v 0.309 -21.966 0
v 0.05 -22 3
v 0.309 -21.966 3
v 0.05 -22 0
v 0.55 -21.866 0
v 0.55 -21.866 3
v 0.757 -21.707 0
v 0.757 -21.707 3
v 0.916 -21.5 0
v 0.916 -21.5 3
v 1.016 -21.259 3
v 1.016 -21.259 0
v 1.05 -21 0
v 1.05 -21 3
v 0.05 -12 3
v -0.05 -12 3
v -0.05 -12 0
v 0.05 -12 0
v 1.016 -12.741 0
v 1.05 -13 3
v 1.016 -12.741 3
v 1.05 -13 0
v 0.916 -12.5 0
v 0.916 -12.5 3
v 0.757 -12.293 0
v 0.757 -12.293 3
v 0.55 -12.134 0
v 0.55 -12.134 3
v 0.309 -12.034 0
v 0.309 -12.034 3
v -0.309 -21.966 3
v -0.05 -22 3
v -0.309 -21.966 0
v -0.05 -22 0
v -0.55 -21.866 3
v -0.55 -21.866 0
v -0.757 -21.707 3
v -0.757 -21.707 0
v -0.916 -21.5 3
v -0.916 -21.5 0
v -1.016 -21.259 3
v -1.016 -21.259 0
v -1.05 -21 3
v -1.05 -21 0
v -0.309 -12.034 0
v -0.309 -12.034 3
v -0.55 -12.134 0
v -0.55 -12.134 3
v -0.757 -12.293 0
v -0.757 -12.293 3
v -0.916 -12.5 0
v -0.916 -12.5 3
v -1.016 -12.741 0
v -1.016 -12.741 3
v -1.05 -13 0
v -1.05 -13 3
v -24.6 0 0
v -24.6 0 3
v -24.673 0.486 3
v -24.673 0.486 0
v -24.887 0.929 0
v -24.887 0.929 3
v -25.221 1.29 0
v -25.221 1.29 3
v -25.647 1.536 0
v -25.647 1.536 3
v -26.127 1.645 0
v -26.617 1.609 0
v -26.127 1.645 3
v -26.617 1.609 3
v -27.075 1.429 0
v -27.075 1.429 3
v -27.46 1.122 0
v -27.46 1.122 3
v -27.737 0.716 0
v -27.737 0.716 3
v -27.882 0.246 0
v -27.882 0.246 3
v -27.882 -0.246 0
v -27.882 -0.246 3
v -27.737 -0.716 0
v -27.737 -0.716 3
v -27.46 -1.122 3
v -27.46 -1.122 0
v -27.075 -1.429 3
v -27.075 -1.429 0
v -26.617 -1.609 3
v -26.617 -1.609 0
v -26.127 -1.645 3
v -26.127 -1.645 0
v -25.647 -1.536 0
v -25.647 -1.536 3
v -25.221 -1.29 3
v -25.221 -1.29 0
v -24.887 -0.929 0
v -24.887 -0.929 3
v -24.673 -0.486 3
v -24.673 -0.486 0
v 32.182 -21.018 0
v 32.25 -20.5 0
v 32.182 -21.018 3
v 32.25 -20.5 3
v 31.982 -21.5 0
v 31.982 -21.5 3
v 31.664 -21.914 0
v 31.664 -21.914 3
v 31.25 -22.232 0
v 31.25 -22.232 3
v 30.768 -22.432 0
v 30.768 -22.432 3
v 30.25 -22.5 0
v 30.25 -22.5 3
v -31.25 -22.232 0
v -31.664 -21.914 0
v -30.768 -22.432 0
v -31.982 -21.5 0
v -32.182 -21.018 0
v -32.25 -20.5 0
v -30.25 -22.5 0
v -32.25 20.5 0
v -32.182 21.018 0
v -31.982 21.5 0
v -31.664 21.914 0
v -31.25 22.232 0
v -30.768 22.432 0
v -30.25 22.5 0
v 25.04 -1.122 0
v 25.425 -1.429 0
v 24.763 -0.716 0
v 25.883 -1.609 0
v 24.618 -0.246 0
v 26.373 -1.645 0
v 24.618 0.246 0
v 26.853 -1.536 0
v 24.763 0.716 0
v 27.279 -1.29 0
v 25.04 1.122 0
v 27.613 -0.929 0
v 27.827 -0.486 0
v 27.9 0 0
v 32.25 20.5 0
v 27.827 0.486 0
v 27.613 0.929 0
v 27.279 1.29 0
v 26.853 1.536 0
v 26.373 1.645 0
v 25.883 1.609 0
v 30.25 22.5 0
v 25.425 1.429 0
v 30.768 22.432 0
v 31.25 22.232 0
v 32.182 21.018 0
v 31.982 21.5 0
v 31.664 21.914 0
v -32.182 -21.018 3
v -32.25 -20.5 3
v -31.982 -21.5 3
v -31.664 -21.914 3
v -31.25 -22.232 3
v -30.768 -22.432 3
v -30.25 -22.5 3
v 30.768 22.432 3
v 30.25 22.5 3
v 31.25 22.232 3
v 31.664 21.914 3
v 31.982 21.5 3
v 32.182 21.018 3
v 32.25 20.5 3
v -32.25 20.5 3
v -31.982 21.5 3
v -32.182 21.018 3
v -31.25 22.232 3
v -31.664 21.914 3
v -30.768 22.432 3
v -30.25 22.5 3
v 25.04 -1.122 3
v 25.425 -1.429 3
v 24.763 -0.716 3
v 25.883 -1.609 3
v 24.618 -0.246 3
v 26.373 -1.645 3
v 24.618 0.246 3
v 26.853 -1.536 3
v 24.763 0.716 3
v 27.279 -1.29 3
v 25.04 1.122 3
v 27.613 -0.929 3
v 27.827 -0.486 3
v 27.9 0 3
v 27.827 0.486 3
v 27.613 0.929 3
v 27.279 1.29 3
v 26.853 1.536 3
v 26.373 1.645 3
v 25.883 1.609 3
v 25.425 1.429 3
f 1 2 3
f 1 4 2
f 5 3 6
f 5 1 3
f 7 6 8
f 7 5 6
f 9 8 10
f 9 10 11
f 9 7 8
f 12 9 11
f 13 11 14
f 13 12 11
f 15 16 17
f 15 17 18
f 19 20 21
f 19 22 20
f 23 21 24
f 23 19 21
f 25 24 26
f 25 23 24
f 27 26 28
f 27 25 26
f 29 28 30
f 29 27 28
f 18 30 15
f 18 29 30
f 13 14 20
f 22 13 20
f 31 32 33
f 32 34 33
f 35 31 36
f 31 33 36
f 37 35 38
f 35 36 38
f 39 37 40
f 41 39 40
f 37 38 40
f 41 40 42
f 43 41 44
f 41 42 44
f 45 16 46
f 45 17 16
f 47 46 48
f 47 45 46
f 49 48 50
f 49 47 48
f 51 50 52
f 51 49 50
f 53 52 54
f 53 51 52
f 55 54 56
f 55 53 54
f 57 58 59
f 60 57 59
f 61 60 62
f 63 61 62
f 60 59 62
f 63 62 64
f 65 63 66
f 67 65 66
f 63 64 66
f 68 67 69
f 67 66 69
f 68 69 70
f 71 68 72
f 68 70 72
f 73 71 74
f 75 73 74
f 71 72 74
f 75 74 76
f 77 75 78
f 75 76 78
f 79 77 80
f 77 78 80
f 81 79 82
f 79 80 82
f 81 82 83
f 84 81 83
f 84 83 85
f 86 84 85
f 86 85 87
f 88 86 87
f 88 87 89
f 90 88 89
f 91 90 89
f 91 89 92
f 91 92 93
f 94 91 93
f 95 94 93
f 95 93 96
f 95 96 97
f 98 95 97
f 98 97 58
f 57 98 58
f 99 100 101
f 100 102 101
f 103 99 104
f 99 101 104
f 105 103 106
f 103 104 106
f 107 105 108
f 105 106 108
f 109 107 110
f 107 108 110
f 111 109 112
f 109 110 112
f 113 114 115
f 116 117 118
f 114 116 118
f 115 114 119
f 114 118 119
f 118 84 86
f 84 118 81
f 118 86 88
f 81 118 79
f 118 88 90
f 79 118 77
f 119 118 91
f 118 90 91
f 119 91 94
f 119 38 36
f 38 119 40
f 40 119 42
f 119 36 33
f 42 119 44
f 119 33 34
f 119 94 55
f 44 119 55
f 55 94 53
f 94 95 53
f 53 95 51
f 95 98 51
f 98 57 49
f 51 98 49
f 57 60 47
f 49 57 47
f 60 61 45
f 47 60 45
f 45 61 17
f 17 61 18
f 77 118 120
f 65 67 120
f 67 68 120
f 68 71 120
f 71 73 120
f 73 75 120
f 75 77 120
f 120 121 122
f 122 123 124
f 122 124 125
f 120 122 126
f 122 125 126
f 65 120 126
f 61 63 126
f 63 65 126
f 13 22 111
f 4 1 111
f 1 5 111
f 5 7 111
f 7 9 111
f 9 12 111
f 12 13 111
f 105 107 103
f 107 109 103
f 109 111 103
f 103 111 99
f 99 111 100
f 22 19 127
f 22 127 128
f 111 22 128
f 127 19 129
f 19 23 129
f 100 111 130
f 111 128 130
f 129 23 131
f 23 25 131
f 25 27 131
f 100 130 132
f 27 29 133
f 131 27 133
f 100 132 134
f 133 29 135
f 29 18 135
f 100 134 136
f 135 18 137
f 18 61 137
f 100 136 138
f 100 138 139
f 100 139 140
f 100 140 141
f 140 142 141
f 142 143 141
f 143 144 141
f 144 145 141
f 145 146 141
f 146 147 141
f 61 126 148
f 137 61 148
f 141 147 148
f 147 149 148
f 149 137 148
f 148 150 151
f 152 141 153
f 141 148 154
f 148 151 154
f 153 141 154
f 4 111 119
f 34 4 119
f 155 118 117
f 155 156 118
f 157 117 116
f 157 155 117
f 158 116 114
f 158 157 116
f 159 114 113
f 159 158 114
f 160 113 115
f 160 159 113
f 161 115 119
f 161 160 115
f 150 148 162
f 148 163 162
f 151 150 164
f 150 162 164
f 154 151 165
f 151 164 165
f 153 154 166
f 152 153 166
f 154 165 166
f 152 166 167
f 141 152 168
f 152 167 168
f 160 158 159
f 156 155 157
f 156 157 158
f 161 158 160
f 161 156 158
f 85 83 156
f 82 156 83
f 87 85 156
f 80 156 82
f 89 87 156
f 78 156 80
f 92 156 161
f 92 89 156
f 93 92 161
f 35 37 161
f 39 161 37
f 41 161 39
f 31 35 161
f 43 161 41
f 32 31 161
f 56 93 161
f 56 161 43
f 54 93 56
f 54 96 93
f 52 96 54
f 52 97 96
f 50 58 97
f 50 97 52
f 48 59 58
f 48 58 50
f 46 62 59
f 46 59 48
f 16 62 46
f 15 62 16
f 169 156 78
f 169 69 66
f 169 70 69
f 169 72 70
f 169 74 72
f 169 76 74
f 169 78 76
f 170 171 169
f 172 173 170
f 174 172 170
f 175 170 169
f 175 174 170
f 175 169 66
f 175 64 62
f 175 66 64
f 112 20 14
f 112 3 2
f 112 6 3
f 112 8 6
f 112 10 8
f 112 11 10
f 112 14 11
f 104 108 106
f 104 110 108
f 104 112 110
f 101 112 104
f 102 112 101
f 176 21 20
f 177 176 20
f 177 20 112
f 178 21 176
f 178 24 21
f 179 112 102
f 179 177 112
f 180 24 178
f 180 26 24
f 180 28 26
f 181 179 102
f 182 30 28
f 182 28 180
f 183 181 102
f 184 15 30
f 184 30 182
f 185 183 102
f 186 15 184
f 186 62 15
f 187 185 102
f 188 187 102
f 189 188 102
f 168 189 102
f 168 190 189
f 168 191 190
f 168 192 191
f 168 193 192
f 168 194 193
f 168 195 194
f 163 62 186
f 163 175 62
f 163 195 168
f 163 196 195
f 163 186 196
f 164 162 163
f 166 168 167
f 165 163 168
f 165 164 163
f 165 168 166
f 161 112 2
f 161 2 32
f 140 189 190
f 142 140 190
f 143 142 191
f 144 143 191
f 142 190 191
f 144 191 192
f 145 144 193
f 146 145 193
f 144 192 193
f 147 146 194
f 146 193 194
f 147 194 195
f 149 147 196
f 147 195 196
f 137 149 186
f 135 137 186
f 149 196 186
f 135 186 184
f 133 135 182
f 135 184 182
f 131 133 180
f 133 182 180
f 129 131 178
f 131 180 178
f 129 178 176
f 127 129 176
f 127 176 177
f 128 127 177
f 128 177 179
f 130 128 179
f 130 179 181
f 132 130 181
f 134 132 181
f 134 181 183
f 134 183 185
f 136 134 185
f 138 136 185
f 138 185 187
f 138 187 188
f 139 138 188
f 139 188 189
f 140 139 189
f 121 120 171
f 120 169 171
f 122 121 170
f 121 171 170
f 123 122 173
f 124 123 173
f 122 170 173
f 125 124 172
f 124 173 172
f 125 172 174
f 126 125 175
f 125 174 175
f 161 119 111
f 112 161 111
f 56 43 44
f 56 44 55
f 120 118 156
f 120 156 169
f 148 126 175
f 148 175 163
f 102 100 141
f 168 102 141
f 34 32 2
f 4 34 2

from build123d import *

# Parameters (mm, degrees)
SKETCH_1_W          = 64.5
SKETCH_1_H          = 45
EXTRUDE_1_DEPTH     = 3
SKETCH_6_W          = 12
SKETCH_6_H          = 10
EXTRUDE_4_DEPTH     = 3
FILLET_1_R          = 2
SKETCH_7_R          = 1.65
CUT_EXTRUDE_3_DEPTH = 6
SKETCH_9_W          = 6
SKETCH_9_H          = 14
CUT_EXTRUDE_4_DEPTH = 10
SKETCH_8_R          = 1.65
CUT_EXTRUDE_5_DEPTH = 10
SKETCH_10_W         = 2.1
SKETCH_10_H         = 10
CUT_EXTRUDE_6_DEPTH = 10
FILLET_2_R          = 1


with BuildPart() as part:
    # 草图1 → 凸台-拉伸1 (new body)
    with BuildSketch(Plane.XY):
        Rectangle(SKETCH_1_W, SKETCH_1_H)
    extrude(amount=EXTRUDE_1_DEPTH)

    # 草图6 → 凸台-拉伸4 (add)
    with BuildSketch(Plane.XY.offset(3)):
        with Locations((32.25, 0)):
            Rectangle(SKETCH_6_W, SKETCH_6_H)
        with Locations((-32.25, 0)):
            Rectangle(SKETCH_6_W, SKETCH_6_H)
    extrude(amount=-EXTRUDE_4_DEPTH)

    # 圆角1
    fillet_1_edges = [part.edges().sort_by_distance(p)[0] for p in [
        (38.25, -5, 1.5),
        (32.25, 5, 1.5),
        (32.25, -5, 1.5),
        (38.25, 5, 1.5),
        (-38.25, 5, 1.5),
        (-32.25, 5, 1.5),
        (-38.25, -5, 1.5),
        (-32.25, -5, 1.5),
        (32.25, -22.5, 1.5),
        (-32.25, -22.5, 1.5),
        (-32.25, 22.5, 1.5),
        (32.25, 22.5, 1.5),
    ]]
    fillet(fillet_1_edges, radius=FILLET_1_R)

    # 草图7 → 切除-拉伸3 (cut)
    with BuildSketch(Plane.XY.offset(3)):
        with Locations((-35.25, 0)):
            Circle(SKETCH_7_R)
        with Locations((35.25, 0)):
            Circle(SKETCH_7_R)
    extrude(amount=-CUT_EXTRUDE_3_DEPTH, mode=Mode.SUBTRACT)

    # 草图9 → 切除-拉伸4 (cut)
    with BuildSketch(Plane.XY.offset(3)):
        with Locations((-35.25, 0)):
            Rectangle(SKETCH_9_W, SKETCH_9_H)
        with Locations((35.25, 0)):
            Rectangle(SKETCH_9_W, SKETCH_9_H)
    extrude(amount=-CUT_EXTRUDE_4_DEPTH, mode=Mode.SUBTRACT)

    # 草图8 → 切除-拉伸5 (cut)
    with BuildSketch(Plane.XY.offset(3)):
        with Locations((-26.25, 0)):
            Circle(SKETCH_8_R)
        with Locations((26.25, 0)):
            Circle(SKETCH_8_R)
    extrude(amount=-CUT_EXTRUDE_5_DEPTH, mode=Mode.SUBTRACT)

    # 草图10 → 切除-拉伸6 (cut)
    with BuildSketch(Plane.XY.offset(3)):
        with Locations((0, -17)):
            Rectangle(SKETCH_10_W, SKETCH_10_H)
    extrude(amount=-CUT_EXTRUDE_6_DEPTH, mode=Mode.SUBTRACT)

    # 圆角2
    fillet_2_edges = [part.edges().sort_by_distance(p)[0] for p in [
        (1.05, -12, 1.5),
        (1.05, -22, 1.5),
        (-1.05, -22, 1.5),
        (-1.05, -12, 1.5),
    ]]
    fillet(fillet_2_edges, radius=FILLET_2_R)


solid = part.part
